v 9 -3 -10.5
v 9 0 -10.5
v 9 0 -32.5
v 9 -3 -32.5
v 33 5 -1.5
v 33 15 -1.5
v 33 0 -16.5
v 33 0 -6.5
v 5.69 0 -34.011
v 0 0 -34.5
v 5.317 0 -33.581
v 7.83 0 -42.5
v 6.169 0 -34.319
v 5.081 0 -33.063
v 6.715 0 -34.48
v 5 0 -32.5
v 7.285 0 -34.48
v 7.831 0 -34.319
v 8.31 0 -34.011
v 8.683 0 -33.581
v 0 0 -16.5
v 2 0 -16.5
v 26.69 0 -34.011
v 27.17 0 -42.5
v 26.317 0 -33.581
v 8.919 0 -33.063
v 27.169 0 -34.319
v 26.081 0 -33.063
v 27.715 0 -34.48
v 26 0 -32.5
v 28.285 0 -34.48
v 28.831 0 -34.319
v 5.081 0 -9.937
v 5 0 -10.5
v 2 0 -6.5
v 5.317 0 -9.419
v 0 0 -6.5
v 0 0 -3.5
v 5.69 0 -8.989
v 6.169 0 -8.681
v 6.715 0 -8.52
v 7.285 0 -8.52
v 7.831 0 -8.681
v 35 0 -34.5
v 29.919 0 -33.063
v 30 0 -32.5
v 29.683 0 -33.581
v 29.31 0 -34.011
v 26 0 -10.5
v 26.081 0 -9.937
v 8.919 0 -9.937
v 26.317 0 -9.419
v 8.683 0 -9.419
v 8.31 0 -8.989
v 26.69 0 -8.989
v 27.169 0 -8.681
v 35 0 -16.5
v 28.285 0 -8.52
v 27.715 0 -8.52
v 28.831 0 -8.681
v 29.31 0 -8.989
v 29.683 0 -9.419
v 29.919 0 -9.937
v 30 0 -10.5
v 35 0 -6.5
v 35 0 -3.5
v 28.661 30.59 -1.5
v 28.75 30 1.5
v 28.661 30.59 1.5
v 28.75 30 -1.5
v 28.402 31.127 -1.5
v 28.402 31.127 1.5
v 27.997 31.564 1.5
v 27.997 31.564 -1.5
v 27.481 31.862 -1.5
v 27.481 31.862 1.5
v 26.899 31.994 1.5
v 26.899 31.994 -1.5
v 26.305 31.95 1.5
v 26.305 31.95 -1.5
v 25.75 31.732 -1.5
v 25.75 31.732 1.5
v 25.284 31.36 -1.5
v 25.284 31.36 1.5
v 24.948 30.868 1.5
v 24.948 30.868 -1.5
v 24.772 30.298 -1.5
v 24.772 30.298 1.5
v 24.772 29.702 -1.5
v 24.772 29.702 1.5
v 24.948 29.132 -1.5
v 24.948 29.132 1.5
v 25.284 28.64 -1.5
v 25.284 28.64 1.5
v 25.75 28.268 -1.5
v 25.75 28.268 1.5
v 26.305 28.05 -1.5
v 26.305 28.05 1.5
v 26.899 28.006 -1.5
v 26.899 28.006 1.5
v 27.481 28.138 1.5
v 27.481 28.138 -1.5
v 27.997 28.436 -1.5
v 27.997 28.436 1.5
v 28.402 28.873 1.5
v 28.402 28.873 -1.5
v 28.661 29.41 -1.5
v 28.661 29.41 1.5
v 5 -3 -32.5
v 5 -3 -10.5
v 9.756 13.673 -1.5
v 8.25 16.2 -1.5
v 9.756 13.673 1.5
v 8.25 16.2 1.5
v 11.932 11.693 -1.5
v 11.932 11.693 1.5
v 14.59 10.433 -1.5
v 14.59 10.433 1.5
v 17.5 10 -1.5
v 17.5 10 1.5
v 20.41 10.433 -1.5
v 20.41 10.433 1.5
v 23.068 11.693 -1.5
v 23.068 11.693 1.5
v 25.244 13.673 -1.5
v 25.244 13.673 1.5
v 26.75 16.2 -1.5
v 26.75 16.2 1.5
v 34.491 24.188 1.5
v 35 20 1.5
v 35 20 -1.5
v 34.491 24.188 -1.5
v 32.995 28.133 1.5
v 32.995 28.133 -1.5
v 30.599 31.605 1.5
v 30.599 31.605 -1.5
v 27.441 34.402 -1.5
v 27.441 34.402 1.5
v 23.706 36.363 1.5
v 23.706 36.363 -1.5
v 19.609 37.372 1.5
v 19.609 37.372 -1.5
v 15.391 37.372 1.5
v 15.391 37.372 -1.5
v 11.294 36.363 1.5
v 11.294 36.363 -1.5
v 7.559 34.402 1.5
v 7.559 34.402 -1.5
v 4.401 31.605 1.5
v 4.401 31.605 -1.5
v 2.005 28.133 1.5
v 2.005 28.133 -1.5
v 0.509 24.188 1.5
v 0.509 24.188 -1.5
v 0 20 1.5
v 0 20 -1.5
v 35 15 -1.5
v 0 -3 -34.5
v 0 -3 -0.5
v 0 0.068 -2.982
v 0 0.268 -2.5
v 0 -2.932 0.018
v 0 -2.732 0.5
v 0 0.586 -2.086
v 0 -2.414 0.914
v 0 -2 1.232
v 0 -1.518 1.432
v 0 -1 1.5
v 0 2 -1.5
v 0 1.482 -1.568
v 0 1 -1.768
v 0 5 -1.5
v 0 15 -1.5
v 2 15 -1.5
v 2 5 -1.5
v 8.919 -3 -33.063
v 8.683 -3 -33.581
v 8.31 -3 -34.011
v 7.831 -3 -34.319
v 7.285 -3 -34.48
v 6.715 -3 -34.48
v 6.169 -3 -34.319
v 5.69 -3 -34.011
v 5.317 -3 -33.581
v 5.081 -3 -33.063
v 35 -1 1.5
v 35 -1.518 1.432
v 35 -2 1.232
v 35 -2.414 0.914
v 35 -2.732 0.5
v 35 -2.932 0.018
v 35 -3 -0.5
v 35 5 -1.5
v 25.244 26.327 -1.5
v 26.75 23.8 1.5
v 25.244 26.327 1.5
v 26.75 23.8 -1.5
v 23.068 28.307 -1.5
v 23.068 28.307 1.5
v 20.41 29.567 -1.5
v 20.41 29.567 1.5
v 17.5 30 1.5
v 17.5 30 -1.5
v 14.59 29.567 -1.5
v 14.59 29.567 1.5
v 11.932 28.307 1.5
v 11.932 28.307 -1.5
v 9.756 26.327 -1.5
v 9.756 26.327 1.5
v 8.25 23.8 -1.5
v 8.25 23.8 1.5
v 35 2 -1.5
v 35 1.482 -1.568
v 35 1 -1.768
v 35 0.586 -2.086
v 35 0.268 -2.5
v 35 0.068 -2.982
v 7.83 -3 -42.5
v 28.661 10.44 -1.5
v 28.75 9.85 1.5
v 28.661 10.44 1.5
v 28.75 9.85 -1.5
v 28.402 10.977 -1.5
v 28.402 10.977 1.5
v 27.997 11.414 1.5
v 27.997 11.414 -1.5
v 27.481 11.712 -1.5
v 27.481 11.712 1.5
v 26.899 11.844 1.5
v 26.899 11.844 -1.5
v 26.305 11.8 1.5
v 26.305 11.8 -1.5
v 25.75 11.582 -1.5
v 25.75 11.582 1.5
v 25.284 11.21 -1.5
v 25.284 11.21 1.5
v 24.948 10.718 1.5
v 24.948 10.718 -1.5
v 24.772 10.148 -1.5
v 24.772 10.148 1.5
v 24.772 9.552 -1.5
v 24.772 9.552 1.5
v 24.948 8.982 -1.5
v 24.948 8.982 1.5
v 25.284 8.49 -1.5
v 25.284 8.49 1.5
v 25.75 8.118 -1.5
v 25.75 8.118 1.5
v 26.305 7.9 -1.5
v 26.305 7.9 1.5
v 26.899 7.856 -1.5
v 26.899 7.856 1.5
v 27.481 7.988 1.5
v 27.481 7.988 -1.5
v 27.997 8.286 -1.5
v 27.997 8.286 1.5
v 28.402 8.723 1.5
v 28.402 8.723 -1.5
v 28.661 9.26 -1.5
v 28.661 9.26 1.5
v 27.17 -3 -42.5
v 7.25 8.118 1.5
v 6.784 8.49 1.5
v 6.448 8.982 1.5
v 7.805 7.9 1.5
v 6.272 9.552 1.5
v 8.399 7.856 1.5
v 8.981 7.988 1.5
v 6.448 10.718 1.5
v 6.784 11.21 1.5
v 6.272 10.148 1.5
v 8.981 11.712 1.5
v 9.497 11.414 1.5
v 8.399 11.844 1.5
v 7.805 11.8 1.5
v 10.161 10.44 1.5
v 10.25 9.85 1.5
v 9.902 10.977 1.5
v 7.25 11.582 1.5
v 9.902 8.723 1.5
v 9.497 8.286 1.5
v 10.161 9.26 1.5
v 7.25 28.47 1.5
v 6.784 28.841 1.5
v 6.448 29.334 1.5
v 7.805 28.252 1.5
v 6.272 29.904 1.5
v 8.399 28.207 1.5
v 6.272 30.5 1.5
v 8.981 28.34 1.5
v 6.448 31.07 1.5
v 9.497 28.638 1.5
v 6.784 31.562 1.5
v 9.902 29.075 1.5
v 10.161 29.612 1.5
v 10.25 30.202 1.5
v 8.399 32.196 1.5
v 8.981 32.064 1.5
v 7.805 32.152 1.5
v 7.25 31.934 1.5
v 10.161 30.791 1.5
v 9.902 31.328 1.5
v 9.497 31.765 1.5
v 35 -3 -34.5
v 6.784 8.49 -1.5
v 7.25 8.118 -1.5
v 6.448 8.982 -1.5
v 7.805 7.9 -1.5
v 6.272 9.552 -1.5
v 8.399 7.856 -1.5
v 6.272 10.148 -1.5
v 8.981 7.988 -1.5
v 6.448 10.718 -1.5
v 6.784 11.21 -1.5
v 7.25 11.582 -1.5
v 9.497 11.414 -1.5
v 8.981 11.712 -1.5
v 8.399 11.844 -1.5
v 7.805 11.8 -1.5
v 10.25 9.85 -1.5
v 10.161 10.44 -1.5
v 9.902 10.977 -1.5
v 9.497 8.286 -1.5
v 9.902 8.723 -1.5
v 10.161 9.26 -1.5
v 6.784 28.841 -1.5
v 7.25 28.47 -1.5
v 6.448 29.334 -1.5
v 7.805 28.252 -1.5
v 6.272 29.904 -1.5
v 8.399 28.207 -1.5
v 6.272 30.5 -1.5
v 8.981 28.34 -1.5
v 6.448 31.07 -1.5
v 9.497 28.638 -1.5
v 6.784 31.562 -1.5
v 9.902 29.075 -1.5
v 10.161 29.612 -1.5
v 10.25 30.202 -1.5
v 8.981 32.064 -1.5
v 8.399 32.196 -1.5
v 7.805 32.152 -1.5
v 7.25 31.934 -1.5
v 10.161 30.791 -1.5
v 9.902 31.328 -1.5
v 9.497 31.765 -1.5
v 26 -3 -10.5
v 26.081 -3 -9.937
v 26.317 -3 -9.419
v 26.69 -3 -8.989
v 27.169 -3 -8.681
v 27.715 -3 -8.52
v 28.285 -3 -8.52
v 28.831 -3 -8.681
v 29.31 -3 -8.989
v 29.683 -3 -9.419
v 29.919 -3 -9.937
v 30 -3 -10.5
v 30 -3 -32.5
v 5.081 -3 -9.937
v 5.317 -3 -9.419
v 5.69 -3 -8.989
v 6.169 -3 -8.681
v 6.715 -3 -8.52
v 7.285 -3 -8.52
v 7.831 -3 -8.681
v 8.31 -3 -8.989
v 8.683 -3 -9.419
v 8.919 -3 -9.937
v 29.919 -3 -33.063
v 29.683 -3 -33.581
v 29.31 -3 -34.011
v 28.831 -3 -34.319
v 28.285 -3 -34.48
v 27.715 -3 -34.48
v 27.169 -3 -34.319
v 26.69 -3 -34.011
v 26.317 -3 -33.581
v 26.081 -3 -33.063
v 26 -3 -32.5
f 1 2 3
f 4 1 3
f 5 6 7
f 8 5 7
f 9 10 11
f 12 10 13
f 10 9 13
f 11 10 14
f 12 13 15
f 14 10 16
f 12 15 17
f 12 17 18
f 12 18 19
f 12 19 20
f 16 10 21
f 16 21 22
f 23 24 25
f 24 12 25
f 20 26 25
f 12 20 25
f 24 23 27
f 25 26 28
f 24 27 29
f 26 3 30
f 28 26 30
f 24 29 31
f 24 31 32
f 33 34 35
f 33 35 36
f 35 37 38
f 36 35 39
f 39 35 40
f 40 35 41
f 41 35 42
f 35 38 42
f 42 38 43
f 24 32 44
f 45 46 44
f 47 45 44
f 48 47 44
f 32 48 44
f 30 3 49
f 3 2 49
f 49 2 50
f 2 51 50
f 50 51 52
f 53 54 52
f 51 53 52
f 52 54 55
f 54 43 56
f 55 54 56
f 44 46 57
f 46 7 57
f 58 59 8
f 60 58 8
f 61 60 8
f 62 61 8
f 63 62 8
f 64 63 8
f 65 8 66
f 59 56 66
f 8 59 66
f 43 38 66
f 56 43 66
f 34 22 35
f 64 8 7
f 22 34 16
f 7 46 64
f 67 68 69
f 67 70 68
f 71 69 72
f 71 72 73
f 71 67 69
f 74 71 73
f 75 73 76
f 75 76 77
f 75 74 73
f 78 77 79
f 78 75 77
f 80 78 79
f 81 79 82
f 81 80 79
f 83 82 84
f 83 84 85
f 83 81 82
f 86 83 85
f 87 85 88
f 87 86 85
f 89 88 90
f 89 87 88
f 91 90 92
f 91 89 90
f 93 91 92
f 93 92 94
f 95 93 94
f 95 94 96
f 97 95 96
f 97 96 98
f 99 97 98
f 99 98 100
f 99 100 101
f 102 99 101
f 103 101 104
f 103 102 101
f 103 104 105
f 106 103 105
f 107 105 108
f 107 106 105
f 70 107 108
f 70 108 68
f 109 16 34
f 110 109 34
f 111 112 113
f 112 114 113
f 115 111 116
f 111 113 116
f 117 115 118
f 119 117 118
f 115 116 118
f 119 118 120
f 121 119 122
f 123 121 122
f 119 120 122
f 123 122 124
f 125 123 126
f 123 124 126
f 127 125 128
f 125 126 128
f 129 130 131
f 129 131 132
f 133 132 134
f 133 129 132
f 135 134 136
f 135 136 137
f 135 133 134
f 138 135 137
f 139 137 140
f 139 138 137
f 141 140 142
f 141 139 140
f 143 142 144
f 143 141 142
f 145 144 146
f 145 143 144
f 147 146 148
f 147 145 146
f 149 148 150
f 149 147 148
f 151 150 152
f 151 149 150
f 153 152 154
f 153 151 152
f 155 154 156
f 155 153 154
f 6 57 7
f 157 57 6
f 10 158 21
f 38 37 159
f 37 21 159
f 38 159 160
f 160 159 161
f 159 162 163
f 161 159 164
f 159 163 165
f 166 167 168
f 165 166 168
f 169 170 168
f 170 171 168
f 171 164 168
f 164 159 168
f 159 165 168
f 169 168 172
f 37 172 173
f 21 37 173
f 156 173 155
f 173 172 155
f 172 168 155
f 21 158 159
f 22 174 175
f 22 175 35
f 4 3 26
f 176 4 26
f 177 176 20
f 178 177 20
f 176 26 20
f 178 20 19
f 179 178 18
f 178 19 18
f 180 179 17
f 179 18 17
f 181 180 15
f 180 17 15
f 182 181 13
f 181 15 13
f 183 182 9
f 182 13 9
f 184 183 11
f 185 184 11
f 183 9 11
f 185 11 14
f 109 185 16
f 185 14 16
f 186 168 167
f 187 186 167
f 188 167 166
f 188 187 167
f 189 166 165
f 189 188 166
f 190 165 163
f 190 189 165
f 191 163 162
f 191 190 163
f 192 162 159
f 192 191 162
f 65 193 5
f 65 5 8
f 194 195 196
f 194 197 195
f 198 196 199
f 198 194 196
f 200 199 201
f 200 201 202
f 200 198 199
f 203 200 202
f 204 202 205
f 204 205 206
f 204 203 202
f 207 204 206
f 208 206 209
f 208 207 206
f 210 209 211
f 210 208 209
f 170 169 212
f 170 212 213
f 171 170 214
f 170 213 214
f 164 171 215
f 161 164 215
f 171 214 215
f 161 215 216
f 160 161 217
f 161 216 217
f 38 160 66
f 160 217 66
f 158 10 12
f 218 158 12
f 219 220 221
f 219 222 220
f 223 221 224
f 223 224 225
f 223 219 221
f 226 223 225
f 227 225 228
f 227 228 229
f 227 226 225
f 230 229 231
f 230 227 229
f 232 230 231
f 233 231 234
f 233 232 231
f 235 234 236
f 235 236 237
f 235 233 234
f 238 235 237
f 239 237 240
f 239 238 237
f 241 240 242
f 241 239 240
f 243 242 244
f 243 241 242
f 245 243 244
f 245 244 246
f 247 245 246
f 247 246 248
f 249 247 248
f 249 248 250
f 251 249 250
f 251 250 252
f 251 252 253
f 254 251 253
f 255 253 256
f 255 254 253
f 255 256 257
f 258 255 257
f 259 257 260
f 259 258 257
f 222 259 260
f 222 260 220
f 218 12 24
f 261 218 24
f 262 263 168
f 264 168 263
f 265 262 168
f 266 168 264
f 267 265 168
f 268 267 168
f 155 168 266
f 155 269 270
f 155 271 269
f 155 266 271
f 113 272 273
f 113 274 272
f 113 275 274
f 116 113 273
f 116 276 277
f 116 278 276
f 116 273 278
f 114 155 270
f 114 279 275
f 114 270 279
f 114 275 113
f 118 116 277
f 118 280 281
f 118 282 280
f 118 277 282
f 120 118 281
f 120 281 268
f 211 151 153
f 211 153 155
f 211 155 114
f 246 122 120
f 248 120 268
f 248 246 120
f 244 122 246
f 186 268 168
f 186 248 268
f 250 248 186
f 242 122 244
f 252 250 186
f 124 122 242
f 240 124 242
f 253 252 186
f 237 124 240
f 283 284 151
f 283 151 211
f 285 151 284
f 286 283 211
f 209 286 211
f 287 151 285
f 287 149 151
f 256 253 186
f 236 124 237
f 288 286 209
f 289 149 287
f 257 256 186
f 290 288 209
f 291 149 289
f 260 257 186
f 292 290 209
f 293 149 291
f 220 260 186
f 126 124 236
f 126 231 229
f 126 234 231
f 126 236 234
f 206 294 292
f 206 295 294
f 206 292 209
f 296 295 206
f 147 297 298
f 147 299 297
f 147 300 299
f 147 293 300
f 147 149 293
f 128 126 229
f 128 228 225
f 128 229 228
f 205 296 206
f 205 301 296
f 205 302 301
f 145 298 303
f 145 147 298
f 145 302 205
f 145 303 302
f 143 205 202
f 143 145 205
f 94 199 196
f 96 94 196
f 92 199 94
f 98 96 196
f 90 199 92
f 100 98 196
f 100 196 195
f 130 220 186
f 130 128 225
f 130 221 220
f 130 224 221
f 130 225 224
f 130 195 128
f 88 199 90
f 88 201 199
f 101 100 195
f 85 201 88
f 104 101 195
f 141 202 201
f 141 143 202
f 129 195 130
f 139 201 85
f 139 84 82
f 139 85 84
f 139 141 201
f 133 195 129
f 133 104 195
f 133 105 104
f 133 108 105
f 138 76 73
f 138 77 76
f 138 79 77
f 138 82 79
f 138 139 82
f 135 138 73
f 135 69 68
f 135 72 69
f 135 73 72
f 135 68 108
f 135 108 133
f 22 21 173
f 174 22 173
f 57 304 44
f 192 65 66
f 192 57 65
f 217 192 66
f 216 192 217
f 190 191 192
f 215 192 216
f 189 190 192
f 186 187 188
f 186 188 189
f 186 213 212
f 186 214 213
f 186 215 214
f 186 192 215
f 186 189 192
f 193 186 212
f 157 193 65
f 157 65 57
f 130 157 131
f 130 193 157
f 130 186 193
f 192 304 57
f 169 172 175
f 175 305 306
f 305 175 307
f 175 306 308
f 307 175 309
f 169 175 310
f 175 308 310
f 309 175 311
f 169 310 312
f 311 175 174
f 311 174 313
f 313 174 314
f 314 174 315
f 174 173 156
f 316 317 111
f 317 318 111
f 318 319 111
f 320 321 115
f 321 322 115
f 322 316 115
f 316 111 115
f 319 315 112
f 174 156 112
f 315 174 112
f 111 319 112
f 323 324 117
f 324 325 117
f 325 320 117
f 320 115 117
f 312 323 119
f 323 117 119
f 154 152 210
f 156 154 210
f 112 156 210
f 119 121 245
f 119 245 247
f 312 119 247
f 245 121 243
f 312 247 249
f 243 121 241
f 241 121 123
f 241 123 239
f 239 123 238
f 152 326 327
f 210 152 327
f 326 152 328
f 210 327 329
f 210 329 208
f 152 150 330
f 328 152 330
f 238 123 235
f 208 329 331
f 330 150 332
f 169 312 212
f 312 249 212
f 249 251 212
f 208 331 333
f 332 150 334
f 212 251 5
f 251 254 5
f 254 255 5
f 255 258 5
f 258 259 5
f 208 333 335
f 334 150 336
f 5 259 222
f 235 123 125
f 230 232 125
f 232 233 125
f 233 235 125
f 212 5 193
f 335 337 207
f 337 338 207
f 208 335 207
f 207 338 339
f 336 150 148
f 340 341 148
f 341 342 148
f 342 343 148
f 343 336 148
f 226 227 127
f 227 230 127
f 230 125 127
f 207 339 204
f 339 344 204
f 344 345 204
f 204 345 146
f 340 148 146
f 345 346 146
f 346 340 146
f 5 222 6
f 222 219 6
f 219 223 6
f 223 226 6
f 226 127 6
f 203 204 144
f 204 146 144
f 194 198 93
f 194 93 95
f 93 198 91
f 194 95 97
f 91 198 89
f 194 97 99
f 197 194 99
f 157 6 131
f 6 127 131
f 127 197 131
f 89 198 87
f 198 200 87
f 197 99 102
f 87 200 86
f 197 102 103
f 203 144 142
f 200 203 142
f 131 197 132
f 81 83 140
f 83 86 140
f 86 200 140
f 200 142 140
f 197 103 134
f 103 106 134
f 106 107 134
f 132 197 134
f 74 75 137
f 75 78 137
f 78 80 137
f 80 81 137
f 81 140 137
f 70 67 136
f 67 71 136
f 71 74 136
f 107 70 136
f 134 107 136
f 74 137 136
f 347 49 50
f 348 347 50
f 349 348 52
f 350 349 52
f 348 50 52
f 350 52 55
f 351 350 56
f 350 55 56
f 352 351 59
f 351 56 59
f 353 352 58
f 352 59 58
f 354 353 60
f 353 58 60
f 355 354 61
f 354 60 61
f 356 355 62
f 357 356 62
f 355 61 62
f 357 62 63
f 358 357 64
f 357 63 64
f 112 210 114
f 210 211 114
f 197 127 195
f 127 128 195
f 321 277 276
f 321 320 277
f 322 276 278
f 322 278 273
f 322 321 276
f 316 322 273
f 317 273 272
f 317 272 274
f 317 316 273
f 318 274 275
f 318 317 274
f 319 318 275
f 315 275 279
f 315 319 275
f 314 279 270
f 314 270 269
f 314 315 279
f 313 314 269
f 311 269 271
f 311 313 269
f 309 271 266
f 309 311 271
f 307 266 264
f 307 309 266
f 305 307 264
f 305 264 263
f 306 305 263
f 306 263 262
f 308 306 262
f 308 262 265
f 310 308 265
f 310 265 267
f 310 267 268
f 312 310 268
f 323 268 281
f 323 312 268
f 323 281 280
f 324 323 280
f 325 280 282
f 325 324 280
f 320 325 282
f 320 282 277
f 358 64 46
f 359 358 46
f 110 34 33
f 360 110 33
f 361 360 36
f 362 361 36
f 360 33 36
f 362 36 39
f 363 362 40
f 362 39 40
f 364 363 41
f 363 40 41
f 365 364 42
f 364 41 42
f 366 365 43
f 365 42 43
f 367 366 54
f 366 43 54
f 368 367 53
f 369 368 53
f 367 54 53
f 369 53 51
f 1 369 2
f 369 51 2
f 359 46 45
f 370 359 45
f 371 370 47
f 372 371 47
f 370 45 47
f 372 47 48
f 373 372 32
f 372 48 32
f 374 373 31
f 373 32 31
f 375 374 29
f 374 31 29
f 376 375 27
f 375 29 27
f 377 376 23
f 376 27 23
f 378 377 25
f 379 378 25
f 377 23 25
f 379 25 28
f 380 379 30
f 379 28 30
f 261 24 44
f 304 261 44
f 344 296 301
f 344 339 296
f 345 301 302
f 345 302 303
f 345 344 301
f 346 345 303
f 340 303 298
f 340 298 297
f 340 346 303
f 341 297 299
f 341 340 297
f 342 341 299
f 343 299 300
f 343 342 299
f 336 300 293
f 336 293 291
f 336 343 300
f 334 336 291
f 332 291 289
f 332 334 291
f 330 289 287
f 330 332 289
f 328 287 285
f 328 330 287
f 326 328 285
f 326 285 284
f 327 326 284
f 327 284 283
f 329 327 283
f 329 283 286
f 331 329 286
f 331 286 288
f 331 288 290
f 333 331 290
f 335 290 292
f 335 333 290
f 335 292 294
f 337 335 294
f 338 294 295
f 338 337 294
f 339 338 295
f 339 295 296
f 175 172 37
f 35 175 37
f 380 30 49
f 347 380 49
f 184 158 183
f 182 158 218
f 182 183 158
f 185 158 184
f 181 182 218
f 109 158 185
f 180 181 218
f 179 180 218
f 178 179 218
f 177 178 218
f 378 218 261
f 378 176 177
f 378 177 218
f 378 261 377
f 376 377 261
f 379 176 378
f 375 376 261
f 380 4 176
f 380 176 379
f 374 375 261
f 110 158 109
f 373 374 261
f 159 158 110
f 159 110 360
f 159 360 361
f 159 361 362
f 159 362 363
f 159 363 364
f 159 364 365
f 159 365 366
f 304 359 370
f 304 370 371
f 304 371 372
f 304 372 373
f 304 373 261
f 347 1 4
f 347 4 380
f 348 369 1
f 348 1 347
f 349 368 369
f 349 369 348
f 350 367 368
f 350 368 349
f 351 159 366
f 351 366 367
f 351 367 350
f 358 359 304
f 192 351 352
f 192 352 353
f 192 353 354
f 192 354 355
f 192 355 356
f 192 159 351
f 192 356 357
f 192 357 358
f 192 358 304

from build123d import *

# Parameters (mm, degrees)
SKETCH1_R           = 2
BOSS_EXTRUDE3_DEPTH = 1.5
SKETCH5_W           = 35
SKETCH5_H           = 3
BOSS_EXTRUDE4_DEPTH = 44
BOSS_EXTRUDE5_DEPTH = 2
CUT_EXTRUDE1_DEPTH  = 67.614562972
FILLET1_R           = 2


with BuildPart() as part:
    # Sketch1 → Boss-Extrude3 (new, symmetric)
    with BuildSketch(Plane.XY):
        with BuildLine():
            Line((0, 0), (35, 0))
            Line((35, 0), (35, 20))
            ThreePointArc((35, 20), (17.5, 37.5), (0, 20))
            Line((0, 20), (0, 0))
        make_face()
        with Locations((8.249962615, 30.201823455)):
            Circle(SKETCH1_R, mode=Mode.SUBTRACT)
        with Locations((26.75, 30)):
            Circle(SKETCH1_R, mode=Mode.SUBTRACT)
        with Locations((8.25, 9.85)):
            Circle(SKETCH1_R, mode=Mode.SUBTRACT)
        with Locations((26.75, 9.85)):
            Circle(SKETCH1_R, mode=Mode.SUBTRACT)
        with BuildLine():
            Line((8.25, 23.799671038), (8.25, 16.200328962))
            ThreePointArc((8.25, 16.200328962), (17.5, 10), (26.75, 16.200328962))
            Line((26.75, 16.200328962), (26.75, 23.799671038))
            ThreePointArc((26.75, 23.799671038), (17.5, 30), (8.25, 23.799671038))
        make_face(mode=Mode.SUBTRACT)
    extrude(amount=BOSS_EXTRUDE3_DEPTH, both=True)

    # Sketch5 → Boss-Extrude4 (add)
    with BuildSketch(Plane.XY.offset(1.5)):
        with Locations((17.5, -1.5)):
            Rectangle(SKETCH5_W, SKETCH5_H)
    extrude(amount=-BOSS_EXTRUDE4_DEPTH)

    # Sketch6 → Boss-Extrude5 (add)
    with BuildSketch(Plane(origin=(35, 0, 0), x_dir=(0, 0, -1), z_dir=(1, 0, 0))):
        Polygon((1.5, 15), (1.5, 5), (6.5, 0), (16.5, 0), align=None)
    boss_extrude5 = extrude(amount=-BOSS_EXTRUDE5_DEPTH)

    # Mirror1: Boss-Extrude5 across plane
    add(boss_extrude5.mirror(Plane(origin=(17.5, 0, 0), x_dir=(0, 0, 1), z_dir=(1, 0, 0))))

    # Sketch7 → Cut-Extrude1 (cut, through all)
    with BuildSketch(Plane(origin=(0, 0, 0), x_dir=(1, 0, 0), z_dir=(0, 1, 0))):
        with BuildLine():
            Line((5, 32.5), (5, 10.5))
            ThreePointArc((5, 10.5), (7, 8.5), (9, 10.5))
            Line((9, 10.5), (9, 32.5))
            ThreePointArc((9, 32.5), (7, 34.5), (5, 32.5))
        make_face()
        with BuildLine():
            Line((26, 32.5), (26, 10.5))
            ThreePointArc((26, 10.5), (28, 8.5), (30, 10.5))
            Line((30, 10.5), (30, 32.5))
            ThreePointArc((30, 32.5), (28, 34.5), (26, 32.5))
        make_face()
        Polygon((35, 42.5), (27.17, 42.5), (35, 34.5), align=None)
        Polygon((0, 42.5), (0, 34.5), (7.83, 42.5), align=None)
    extrude(amount=-CUT_EXTRUDE1_DEPTH, mode=Mode.SUBTRACT)

    # Fillet1
    fillet1_edges = [part.edges().sort_by_distance(p)[0] for p in [
        (17.5, -3, 1.5),
        (17.5, 0, -1.5),
    ]]
    fillet(fillet1_edges, radius=FILLET1_R)


solid = part.part
